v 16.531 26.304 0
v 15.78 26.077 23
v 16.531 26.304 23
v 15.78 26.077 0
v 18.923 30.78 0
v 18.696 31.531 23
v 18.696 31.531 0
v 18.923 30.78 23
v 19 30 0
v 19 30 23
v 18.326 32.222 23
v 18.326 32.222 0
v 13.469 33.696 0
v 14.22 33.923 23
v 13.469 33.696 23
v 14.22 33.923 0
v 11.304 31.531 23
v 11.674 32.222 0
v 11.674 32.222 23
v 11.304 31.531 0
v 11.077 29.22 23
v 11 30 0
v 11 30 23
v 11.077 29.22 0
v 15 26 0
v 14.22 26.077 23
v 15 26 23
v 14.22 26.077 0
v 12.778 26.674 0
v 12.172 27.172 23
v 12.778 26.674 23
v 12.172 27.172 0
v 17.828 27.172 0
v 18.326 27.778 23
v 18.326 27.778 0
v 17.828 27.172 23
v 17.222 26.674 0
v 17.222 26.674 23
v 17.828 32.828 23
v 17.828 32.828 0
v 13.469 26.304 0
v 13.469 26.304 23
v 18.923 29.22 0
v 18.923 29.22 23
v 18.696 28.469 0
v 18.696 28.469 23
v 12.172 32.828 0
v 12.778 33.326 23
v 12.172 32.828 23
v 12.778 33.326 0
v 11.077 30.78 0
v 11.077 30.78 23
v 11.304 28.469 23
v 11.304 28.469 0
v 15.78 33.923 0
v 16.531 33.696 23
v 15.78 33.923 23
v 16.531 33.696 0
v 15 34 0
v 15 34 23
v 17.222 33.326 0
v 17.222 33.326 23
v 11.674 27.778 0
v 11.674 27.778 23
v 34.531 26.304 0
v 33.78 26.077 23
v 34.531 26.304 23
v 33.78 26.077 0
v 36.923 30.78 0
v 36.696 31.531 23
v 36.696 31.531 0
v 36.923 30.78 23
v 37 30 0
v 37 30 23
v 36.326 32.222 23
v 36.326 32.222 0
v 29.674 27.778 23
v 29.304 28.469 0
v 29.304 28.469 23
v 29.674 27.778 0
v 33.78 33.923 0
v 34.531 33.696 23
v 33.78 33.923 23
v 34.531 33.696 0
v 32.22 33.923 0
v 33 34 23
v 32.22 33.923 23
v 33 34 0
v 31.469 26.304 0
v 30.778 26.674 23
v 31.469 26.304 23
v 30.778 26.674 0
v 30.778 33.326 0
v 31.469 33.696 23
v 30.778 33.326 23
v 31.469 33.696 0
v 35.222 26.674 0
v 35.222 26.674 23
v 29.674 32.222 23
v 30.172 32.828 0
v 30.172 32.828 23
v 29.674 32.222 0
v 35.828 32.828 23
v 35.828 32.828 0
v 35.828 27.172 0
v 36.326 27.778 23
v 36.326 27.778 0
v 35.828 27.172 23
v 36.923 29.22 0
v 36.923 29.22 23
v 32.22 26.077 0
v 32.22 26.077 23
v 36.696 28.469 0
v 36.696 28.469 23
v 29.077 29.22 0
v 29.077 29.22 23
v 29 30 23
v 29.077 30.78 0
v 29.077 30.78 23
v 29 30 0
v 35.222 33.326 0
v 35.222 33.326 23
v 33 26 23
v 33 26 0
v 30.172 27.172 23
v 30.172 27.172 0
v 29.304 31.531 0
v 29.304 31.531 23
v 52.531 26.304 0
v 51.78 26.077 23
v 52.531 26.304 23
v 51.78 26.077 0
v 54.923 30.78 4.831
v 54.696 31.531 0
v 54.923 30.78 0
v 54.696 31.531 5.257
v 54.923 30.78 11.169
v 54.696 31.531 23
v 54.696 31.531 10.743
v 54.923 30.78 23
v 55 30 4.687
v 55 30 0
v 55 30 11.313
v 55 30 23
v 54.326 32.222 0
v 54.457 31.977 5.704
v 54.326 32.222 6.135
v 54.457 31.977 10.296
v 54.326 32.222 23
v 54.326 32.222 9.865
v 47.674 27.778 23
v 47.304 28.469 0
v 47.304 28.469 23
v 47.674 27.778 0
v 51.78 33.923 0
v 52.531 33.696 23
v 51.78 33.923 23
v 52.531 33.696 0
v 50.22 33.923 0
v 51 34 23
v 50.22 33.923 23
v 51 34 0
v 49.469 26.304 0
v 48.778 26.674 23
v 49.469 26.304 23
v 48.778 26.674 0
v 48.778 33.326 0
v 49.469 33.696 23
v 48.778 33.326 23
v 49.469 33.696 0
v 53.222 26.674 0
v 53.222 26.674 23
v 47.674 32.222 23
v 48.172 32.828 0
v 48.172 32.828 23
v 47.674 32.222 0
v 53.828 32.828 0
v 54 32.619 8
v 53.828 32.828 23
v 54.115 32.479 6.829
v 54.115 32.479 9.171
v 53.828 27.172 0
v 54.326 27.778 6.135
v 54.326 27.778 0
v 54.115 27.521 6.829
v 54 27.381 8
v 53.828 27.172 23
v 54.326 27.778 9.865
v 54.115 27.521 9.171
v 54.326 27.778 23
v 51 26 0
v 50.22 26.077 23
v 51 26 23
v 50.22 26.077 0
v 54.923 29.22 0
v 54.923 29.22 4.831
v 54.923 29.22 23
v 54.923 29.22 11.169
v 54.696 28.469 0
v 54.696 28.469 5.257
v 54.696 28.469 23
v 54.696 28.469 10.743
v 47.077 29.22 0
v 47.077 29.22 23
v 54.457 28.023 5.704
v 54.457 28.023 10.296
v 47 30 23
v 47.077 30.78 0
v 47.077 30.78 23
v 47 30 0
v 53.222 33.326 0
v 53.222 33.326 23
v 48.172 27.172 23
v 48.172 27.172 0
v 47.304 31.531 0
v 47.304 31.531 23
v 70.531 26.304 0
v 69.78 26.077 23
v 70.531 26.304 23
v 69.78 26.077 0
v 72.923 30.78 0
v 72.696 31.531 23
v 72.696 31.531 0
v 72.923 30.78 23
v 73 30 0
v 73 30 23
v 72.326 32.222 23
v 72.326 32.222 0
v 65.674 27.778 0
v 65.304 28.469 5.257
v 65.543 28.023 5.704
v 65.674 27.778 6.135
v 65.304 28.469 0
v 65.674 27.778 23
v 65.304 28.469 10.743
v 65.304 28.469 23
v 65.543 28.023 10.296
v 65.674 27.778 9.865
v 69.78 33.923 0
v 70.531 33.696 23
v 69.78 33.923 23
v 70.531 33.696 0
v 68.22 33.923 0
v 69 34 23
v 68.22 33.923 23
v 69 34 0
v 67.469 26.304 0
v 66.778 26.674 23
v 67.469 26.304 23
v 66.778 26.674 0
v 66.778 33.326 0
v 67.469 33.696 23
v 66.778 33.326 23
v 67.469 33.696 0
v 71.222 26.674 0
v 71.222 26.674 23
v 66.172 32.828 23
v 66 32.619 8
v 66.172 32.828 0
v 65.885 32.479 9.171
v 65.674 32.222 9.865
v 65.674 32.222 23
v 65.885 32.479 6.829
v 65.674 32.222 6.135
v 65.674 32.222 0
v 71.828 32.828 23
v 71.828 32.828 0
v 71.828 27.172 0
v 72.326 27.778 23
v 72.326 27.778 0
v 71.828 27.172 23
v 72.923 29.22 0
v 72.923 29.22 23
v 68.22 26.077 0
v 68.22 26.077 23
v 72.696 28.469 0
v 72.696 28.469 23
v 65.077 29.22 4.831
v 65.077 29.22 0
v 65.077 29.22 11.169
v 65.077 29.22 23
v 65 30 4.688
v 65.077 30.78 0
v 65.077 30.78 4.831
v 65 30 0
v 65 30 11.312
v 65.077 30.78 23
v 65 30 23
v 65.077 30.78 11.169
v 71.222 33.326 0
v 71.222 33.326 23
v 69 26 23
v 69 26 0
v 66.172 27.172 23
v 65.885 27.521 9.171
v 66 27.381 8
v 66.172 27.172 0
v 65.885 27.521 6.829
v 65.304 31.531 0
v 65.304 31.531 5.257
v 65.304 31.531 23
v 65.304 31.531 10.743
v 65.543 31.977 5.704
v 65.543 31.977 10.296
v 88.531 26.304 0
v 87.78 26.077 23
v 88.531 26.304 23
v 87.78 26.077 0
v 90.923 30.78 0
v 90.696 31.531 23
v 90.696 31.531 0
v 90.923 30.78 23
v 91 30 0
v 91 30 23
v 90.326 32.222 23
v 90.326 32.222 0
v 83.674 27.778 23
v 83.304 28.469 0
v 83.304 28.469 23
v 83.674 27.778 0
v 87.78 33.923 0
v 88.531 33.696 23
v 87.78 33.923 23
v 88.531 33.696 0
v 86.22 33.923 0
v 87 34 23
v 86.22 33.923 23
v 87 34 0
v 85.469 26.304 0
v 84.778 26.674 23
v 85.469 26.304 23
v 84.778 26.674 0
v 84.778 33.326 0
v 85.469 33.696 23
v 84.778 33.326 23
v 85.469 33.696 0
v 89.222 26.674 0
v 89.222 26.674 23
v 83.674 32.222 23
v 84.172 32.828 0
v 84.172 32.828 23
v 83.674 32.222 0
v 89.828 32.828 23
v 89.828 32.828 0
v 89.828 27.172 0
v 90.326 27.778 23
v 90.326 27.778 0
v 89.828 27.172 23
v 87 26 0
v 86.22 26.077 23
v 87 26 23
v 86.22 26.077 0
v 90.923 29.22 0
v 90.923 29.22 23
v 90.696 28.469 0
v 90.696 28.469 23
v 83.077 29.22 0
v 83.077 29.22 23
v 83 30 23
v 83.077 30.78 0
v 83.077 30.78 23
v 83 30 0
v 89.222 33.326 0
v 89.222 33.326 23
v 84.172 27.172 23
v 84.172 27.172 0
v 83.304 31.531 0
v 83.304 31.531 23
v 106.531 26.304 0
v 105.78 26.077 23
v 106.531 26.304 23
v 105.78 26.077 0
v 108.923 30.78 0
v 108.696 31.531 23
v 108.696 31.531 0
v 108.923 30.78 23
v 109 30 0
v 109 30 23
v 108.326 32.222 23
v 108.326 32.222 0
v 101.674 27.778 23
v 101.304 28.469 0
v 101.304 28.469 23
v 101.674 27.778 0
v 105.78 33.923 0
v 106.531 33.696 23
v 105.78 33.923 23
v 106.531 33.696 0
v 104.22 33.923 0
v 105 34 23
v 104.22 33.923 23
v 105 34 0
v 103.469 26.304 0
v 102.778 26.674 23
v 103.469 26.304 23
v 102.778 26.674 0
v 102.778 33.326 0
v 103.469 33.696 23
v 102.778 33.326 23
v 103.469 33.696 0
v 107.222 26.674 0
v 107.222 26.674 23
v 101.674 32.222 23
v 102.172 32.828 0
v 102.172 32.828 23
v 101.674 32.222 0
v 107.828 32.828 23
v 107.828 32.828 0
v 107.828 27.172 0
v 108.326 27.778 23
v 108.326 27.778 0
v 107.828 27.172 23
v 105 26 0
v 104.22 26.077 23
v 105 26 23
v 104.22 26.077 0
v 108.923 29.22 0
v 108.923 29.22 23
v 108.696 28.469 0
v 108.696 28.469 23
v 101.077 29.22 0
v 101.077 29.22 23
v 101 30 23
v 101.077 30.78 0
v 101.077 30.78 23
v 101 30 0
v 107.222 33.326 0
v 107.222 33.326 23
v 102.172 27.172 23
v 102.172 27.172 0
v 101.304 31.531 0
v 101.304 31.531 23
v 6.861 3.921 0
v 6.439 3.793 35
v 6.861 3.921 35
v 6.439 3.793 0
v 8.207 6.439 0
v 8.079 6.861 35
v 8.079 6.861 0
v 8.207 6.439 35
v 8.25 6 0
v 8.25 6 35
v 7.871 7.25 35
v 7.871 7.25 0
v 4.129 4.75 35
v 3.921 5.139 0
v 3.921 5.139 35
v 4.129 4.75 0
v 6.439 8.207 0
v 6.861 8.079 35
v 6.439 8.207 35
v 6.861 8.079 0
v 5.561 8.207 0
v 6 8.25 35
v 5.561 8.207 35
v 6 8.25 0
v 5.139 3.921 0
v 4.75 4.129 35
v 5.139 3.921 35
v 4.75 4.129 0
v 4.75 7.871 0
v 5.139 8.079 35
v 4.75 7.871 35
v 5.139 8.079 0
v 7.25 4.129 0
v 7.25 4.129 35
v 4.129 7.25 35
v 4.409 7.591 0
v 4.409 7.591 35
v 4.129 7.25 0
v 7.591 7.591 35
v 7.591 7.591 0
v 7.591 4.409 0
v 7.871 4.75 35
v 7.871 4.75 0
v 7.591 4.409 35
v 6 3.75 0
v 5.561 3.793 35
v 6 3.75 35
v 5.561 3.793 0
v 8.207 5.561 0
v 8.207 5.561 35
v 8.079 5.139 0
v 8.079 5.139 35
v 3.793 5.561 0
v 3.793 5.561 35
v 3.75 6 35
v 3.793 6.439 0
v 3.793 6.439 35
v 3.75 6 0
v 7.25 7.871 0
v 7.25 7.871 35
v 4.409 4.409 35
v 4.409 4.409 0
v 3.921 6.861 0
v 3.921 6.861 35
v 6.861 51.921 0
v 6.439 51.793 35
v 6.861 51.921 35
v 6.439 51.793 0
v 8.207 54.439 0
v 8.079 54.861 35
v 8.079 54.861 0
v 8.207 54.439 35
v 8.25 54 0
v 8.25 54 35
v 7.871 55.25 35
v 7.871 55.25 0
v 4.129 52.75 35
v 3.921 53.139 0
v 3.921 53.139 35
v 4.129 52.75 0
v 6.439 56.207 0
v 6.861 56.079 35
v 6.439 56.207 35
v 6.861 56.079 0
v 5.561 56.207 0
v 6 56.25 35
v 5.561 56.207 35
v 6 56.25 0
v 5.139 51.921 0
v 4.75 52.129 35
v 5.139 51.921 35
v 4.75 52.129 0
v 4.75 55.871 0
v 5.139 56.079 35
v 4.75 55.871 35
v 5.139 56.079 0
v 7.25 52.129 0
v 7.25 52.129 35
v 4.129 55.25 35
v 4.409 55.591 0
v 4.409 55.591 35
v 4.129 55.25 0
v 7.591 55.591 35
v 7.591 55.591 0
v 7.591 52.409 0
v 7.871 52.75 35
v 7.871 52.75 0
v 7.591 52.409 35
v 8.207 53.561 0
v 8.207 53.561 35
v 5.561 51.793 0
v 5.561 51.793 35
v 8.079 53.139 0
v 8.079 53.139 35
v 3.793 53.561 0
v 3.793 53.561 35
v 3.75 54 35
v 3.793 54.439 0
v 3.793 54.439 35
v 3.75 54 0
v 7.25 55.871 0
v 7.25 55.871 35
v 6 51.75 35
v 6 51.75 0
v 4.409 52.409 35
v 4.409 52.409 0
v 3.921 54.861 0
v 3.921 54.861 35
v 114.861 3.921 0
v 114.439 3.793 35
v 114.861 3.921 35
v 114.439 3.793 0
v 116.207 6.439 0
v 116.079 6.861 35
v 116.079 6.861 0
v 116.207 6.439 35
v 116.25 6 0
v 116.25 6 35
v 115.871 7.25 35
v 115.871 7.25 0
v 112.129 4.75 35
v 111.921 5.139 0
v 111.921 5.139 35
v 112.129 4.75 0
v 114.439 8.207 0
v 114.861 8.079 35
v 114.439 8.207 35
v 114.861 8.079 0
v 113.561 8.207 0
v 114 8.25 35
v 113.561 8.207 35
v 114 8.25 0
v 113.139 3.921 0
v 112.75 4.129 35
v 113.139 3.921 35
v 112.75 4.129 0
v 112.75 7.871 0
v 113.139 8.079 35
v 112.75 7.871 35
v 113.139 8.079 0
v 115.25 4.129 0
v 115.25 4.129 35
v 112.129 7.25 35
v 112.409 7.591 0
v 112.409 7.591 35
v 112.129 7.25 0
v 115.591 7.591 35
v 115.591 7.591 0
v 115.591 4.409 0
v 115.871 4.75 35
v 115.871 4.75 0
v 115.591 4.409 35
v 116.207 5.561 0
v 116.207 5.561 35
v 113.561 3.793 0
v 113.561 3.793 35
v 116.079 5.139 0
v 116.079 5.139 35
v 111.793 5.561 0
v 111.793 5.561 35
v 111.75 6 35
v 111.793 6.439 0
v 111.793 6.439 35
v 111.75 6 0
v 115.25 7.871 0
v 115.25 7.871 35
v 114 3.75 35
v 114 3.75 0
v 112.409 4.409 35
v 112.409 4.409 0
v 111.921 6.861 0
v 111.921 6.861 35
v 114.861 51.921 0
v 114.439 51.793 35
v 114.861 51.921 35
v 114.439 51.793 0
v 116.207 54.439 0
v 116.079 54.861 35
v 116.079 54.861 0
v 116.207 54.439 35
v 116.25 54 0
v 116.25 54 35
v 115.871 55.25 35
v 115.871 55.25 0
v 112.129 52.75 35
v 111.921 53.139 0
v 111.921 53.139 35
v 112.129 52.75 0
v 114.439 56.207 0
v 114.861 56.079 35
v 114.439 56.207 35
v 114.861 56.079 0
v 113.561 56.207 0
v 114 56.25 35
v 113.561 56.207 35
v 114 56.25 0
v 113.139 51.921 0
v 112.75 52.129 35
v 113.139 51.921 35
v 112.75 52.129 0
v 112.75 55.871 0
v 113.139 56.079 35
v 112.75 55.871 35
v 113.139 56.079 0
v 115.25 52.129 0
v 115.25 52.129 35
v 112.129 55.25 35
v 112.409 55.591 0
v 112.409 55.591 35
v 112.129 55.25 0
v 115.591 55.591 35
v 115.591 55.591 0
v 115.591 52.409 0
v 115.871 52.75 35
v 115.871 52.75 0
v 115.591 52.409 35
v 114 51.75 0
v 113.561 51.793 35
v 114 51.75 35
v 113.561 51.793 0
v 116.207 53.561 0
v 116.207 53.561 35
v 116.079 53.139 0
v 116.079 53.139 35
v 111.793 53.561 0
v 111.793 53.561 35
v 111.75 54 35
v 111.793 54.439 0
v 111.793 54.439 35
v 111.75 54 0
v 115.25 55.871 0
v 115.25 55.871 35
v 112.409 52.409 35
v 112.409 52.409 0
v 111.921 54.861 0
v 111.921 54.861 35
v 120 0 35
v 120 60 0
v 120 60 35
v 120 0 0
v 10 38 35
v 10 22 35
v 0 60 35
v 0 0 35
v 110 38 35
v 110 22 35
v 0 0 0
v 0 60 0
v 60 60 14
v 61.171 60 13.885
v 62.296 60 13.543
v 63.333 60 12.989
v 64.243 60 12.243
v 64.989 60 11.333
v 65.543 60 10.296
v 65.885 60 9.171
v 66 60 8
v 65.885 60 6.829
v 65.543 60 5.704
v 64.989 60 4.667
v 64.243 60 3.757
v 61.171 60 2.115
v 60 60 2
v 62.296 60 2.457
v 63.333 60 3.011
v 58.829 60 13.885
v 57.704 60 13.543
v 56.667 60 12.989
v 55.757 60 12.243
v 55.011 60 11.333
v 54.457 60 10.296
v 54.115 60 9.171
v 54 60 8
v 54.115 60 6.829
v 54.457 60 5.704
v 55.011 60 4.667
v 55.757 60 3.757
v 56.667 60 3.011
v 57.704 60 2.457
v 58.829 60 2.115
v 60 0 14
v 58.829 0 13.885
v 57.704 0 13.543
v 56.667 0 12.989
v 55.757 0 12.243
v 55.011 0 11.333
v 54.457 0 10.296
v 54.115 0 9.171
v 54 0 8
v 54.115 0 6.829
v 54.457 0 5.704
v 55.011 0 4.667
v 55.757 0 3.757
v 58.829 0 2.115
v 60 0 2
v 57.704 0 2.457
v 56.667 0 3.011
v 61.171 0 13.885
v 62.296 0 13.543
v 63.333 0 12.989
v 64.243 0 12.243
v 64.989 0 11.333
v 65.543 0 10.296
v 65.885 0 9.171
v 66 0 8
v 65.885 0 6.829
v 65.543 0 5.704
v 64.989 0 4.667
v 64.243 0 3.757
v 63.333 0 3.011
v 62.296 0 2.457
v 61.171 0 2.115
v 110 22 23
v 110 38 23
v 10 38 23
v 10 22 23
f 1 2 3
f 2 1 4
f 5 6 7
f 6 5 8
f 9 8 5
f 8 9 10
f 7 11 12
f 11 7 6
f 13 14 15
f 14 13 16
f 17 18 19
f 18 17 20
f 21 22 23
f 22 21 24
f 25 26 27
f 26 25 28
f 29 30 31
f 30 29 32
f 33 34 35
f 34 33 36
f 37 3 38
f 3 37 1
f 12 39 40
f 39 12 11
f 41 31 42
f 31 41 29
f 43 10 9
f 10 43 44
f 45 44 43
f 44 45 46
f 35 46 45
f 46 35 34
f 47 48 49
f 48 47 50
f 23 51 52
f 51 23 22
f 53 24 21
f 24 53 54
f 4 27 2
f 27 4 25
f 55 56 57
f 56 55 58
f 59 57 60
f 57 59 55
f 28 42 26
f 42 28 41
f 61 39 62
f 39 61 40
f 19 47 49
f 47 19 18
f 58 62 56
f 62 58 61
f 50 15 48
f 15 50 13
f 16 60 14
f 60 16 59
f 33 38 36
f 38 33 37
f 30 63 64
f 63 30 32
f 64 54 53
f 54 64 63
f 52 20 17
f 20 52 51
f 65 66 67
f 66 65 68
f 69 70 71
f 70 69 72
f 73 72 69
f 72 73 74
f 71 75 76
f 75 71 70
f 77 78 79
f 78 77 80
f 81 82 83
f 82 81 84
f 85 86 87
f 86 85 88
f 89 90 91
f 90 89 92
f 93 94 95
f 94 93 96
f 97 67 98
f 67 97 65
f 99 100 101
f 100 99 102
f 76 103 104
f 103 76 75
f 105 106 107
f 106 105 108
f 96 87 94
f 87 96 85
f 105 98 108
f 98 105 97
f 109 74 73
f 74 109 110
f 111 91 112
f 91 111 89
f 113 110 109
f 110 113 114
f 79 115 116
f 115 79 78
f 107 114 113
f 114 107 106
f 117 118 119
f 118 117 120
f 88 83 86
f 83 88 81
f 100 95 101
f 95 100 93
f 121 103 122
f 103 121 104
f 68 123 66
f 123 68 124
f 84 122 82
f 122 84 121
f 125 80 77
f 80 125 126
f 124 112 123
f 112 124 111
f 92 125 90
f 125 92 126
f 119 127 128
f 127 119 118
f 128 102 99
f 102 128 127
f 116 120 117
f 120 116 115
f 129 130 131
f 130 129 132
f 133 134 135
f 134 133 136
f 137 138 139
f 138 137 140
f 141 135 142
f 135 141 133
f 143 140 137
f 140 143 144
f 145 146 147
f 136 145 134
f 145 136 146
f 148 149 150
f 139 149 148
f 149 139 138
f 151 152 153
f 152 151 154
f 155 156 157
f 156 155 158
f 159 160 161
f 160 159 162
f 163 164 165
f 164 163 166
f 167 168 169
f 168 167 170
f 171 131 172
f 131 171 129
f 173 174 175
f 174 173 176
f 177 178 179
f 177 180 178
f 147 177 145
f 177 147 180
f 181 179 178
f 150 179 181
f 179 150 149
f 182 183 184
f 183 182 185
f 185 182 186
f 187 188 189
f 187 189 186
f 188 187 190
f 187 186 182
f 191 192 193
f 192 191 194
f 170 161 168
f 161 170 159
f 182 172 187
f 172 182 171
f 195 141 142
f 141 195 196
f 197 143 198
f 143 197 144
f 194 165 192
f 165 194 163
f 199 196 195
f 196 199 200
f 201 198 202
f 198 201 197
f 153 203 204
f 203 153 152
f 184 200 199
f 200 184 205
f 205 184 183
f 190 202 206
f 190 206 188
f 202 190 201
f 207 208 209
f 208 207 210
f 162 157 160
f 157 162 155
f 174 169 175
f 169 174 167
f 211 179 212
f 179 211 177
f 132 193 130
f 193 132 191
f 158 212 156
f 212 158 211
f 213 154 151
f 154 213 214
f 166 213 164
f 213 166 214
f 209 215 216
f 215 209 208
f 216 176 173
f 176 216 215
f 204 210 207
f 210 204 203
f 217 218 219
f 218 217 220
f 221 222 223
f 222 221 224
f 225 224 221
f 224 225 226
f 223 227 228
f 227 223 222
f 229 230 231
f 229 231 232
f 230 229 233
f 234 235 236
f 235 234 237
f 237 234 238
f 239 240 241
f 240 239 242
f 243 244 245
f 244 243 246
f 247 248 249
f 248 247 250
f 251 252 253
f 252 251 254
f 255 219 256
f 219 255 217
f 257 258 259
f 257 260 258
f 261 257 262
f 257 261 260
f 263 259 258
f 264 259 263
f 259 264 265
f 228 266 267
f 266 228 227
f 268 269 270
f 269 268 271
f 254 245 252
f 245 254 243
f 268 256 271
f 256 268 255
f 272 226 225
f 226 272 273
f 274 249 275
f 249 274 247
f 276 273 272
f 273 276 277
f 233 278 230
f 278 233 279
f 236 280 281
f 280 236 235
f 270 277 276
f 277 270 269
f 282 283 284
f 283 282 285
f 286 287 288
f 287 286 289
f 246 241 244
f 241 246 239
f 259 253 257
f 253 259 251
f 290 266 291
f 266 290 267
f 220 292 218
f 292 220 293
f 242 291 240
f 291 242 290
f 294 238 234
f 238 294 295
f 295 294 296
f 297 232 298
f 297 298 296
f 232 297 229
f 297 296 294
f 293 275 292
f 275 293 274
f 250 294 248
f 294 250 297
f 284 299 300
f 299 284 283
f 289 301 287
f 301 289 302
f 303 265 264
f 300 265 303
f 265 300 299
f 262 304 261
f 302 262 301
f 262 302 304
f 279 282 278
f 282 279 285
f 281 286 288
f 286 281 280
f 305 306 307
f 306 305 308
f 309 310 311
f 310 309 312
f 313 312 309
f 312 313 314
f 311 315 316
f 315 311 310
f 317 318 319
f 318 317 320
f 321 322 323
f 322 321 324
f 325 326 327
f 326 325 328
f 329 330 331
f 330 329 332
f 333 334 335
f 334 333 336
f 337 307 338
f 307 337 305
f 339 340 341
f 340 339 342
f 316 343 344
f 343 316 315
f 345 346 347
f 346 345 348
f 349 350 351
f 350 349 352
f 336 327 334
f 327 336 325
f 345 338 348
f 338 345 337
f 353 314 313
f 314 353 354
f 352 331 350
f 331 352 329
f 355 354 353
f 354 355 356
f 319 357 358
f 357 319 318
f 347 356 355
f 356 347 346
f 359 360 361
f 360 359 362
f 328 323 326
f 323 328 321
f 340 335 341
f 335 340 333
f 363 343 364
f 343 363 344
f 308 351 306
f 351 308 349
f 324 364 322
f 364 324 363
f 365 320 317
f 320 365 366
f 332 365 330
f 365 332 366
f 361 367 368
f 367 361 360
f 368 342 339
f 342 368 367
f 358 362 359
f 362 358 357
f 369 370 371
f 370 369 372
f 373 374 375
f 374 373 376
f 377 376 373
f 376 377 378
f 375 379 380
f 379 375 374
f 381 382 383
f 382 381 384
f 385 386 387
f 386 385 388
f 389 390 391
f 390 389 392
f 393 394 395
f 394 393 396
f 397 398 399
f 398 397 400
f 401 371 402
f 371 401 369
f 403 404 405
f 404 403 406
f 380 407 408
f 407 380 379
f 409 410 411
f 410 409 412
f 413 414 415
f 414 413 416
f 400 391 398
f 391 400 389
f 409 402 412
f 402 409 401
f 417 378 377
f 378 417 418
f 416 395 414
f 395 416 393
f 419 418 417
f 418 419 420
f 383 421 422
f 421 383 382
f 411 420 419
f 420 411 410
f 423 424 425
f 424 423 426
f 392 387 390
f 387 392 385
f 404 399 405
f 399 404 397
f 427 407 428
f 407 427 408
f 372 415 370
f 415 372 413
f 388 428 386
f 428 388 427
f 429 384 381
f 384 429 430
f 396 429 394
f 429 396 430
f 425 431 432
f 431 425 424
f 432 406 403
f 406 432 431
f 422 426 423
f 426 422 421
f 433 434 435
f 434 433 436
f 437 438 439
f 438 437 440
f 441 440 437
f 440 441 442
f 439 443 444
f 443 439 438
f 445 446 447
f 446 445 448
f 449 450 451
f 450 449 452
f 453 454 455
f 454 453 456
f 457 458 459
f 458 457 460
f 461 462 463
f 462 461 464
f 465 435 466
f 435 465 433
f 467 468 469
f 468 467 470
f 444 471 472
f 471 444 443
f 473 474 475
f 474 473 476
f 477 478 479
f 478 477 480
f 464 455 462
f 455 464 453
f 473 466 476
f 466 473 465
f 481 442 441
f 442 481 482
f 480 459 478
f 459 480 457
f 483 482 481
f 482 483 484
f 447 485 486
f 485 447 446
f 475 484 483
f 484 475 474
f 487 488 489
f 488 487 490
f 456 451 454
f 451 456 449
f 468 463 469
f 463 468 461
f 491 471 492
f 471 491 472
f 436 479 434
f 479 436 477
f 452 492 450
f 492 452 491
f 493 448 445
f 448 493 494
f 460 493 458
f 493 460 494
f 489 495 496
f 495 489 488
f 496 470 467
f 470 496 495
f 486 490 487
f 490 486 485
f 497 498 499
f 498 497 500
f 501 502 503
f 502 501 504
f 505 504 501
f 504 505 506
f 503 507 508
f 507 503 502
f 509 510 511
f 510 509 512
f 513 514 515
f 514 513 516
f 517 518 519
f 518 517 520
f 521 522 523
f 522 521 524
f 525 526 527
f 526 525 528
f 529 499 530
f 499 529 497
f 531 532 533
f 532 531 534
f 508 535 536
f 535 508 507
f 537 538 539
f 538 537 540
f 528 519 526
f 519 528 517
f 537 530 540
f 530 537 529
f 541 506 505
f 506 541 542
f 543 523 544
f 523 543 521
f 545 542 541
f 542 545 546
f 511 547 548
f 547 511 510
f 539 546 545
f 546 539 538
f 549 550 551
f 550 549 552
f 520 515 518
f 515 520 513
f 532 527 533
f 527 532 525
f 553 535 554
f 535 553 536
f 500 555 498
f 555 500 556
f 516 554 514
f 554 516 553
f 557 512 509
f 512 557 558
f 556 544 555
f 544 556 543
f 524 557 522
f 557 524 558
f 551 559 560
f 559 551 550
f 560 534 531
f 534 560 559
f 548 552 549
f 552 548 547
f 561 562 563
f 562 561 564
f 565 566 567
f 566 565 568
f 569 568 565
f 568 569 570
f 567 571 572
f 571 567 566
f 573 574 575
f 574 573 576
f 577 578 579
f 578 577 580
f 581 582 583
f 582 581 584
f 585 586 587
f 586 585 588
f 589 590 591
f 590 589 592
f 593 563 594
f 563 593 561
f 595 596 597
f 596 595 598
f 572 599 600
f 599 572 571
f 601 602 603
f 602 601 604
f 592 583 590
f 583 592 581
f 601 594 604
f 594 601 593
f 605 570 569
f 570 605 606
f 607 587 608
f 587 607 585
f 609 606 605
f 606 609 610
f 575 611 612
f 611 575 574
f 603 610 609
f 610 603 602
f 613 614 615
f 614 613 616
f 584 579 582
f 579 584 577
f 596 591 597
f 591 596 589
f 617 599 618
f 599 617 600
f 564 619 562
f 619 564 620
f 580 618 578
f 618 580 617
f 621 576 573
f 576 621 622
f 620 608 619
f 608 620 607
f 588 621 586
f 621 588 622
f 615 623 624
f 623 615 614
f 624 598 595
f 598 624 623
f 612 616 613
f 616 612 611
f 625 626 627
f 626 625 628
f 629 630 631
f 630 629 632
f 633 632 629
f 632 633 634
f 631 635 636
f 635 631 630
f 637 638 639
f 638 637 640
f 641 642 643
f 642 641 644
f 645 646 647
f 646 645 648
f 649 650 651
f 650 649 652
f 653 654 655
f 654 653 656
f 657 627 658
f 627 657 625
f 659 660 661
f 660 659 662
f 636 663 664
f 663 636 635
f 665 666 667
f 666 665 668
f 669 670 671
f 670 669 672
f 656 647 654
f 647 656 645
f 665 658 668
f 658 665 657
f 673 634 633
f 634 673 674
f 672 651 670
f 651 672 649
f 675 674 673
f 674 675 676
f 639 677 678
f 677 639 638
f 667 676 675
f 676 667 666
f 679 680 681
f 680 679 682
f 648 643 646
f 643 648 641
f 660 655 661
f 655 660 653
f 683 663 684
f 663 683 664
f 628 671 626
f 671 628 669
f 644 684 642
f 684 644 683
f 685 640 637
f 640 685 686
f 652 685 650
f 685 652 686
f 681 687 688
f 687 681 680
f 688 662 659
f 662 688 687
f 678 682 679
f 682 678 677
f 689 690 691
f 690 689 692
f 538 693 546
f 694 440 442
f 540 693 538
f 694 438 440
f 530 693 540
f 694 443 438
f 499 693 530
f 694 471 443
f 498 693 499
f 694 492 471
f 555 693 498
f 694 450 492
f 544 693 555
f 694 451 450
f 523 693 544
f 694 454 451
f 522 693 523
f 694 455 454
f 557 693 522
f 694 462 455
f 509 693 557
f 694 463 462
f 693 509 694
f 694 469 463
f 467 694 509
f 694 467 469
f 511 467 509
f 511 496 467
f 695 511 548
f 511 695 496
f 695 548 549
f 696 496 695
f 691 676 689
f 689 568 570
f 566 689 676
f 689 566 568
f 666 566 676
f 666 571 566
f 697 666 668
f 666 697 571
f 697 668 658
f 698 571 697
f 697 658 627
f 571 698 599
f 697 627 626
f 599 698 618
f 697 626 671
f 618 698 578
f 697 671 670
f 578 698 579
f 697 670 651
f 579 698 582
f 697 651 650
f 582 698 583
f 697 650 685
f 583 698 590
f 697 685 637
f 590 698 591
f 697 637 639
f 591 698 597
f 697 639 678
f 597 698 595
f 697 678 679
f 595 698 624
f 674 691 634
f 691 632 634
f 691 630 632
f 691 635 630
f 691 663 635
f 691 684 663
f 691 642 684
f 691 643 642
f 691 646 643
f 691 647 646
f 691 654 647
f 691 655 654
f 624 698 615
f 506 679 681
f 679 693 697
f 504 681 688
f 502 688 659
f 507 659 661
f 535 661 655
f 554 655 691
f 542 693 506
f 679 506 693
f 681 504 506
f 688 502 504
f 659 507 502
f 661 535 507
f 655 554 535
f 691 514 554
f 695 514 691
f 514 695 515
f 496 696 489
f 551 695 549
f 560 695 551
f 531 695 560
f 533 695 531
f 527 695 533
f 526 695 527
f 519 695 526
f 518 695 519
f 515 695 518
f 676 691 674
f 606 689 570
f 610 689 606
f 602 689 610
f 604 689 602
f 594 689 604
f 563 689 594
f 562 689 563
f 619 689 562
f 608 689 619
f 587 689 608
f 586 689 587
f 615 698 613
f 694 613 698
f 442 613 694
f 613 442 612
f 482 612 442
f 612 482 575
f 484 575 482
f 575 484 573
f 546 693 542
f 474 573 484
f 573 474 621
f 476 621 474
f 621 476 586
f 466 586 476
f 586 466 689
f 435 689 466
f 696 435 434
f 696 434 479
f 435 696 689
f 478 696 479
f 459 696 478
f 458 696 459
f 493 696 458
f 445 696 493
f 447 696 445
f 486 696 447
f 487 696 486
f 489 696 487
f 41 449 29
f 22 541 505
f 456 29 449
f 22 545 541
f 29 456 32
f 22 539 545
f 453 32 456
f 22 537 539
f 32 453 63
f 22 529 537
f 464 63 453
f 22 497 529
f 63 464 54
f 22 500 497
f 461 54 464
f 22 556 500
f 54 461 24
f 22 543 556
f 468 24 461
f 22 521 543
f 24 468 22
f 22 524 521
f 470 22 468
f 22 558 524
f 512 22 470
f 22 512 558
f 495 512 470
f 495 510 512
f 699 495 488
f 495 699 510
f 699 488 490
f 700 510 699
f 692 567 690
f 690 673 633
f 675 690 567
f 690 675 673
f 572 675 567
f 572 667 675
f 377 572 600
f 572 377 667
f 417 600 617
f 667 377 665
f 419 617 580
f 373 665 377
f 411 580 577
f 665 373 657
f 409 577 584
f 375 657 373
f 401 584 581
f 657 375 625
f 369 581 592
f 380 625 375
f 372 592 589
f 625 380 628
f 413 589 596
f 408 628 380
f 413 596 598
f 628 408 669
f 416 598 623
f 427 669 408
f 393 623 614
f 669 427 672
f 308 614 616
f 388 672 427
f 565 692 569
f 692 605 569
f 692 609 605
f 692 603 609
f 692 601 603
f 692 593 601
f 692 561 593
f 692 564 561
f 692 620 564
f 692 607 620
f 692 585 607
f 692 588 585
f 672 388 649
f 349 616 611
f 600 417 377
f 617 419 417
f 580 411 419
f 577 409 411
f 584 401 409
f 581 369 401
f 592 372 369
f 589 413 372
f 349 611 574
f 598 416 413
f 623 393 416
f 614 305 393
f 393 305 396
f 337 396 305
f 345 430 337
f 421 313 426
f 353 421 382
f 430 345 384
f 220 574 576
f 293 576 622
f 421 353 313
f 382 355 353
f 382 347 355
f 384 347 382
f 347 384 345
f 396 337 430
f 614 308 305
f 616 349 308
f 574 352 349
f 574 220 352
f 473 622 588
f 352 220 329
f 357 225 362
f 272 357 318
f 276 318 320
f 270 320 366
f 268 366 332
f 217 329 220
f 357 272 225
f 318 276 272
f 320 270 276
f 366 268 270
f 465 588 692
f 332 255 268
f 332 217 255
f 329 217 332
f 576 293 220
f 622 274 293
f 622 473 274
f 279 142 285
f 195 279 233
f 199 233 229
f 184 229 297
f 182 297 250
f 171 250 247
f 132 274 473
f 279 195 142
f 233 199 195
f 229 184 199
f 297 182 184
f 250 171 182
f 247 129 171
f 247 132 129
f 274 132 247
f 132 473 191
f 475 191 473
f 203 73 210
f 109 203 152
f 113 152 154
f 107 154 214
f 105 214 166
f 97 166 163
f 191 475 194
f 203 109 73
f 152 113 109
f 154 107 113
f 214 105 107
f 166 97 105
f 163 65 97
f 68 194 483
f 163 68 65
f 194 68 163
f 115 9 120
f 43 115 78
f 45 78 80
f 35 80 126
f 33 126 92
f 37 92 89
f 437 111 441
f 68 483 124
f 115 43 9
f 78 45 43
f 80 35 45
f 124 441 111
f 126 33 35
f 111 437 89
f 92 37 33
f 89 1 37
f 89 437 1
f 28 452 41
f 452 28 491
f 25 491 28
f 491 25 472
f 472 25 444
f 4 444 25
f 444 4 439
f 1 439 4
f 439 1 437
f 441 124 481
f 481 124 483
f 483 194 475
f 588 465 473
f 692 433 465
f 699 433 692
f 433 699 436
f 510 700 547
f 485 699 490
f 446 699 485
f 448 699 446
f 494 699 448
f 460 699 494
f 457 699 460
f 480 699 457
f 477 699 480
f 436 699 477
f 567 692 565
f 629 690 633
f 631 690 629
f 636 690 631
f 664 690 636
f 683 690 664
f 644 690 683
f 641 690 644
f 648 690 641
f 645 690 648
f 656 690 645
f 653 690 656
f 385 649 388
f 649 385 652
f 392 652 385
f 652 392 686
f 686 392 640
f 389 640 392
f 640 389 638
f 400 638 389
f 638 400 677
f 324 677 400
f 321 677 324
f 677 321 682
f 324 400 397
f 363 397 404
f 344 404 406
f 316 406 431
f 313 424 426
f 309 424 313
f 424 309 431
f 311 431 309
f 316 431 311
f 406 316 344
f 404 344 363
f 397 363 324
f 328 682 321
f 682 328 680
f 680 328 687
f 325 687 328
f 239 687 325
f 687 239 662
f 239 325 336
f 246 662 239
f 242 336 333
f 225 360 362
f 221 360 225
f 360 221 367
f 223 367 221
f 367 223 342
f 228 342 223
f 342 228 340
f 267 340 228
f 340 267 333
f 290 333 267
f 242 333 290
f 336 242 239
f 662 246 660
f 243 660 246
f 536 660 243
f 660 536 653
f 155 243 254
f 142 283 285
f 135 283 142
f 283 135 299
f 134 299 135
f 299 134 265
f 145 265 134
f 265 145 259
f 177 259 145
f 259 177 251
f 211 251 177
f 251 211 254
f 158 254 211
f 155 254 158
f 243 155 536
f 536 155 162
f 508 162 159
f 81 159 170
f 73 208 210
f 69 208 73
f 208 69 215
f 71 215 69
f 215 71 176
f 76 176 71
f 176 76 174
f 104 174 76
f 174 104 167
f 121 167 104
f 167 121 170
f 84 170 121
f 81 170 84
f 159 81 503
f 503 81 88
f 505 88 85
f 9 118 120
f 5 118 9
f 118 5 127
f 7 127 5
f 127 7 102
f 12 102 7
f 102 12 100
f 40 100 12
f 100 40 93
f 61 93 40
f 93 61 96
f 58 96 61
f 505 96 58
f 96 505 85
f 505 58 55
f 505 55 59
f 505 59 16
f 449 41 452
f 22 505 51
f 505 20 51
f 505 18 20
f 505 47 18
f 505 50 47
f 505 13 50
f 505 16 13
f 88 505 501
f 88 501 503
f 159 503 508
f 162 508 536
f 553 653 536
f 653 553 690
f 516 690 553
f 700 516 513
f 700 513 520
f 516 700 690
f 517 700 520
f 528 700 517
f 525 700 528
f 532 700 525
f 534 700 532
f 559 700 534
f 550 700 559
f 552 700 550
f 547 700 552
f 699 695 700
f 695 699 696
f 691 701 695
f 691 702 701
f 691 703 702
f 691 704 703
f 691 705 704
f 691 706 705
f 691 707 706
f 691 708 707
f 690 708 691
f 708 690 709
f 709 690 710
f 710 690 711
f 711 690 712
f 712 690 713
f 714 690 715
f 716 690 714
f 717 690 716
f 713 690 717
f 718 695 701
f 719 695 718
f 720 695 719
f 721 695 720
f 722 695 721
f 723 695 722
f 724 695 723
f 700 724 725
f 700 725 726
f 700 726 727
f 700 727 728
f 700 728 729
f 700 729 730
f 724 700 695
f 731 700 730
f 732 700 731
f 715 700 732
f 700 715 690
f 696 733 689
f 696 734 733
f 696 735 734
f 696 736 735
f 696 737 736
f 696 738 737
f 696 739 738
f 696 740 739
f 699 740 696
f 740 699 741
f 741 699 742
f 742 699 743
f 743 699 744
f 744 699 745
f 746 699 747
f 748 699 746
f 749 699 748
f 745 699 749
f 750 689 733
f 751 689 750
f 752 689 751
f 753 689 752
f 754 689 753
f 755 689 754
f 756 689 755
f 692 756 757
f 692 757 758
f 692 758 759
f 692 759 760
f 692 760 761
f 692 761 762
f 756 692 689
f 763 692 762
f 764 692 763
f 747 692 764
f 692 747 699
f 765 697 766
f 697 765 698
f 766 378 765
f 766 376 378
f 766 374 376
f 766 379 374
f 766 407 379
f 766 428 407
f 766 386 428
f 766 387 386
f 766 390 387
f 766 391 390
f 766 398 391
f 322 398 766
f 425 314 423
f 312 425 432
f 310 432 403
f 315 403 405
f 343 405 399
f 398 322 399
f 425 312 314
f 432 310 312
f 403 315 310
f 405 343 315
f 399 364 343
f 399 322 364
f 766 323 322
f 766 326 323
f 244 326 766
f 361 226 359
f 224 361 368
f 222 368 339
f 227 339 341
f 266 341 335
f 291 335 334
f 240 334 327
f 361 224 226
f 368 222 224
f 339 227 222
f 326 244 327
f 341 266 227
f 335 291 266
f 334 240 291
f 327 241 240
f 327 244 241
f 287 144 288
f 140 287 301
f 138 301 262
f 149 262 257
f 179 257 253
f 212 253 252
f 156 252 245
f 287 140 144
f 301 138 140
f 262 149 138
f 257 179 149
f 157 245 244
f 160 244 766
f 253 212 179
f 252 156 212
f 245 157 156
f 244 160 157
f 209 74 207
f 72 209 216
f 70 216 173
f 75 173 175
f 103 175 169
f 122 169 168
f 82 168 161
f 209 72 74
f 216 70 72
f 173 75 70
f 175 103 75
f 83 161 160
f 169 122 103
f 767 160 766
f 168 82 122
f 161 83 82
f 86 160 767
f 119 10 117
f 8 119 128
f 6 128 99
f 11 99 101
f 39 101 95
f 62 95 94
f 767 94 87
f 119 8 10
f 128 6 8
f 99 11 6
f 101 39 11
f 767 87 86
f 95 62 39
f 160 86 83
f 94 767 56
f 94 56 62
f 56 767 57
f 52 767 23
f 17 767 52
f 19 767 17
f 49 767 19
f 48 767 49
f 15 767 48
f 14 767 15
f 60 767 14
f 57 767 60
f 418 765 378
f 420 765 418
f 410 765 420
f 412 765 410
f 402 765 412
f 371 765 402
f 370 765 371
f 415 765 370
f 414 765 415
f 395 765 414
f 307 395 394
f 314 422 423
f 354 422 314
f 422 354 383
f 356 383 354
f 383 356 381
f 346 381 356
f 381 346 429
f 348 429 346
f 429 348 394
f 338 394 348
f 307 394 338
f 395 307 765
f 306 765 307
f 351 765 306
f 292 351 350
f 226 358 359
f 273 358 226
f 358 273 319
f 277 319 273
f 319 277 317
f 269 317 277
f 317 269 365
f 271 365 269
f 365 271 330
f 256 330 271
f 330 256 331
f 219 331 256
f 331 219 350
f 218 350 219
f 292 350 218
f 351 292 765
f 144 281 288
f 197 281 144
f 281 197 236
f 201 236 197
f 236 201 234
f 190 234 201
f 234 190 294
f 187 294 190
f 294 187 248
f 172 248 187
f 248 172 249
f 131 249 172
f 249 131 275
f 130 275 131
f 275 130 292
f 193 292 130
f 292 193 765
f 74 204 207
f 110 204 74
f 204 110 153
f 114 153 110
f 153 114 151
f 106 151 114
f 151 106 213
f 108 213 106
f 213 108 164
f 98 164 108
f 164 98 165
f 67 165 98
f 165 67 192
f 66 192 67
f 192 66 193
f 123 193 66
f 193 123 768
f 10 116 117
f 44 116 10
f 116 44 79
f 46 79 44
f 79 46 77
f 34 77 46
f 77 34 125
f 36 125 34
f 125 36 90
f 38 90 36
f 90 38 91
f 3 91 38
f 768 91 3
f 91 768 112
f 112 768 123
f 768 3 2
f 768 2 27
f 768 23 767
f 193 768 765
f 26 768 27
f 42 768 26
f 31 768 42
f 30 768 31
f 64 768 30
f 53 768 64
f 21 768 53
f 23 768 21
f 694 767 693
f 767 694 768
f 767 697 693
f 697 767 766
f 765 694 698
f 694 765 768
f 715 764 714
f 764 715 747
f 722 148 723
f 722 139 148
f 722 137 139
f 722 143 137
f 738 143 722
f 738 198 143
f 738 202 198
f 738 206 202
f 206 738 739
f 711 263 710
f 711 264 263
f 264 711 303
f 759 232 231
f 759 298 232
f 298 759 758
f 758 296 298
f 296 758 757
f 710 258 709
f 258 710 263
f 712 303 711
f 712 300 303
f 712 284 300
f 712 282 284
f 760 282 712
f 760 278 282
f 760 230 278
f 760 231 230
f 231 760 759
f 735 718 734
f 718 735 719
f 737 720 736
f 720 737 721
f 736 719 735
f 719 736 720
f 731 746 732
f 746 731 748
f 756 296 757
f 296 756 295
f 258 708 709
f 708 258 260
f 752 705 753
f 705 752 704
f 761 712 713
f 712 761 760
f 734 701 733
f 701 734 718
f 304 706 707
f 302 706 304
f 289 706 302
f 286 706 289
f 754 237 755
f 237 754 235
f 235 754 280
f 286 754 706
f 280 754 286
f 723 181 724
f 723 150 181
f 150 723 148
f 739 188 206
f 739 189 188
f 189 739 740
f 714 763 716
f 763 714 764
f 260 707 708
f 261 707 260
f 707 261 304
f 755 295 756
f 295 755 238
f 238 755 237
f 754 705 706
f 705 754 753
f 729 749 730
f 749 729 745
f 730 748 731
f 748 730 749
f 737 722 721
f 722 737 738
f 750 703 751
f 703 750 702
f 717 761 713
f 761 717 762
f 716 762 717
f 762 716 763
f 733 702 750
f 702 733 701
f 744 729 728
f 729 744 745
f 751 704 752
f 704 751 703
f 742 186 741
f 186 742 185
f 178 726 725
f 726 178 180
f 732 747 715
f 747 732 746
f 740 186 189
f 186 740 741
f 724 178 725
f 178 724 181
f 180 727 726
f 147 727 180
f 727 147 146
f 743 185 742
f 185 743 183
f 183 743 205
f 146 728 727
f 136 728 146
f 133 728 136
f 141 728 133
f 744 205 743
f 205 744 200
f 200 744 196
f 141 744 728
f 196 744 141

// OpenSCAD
$fn = 32;

// ----------------------------------------------------------------------
// Manifold block: side_outlet manifold
// ----------------------------------------------------------------------

// --- parameters (mm) ---
block_l = 120;            // block length, X
block_w = 60;             // block width, Y
block_h = 35;             // block height, Z
port_d = 8;               // port bore diameter
port_pitch = 18;          // port pitch along X
gallery_d = 16;           // top gallery width, Y
gallery_depth = 12;       // gallery pocket depth
wall_p = 10;              // gallery end wall thickness, X
mnt_d = 4.5;              // mounting hole diameter
mnt_in = 6;               // mounting hole inset from the edges
out_d = 12;               // outlet bore diameter
out_z = 8;                // outlet axis height
fit_tol = 0.05;           // tolerance for press fits, mm
free_tol = 0.2;           // tolerance for clearance fits, mm

n_ports = 6;  // ports in the row
port_x0 = (block_l - (n_ports - 1) * port_pitch) / 2;  // first port X

difference() {
  cube([block_l, block_w, block_h]);
  for (i = [0 : n_ports - 1])
    translate([port_x0 + i * port_pitch, block_w / 2, -1])
      cylinder(h = block_h + 2, d = port_d);
  translate([wall_p, block_w / 2 - gallery_d / 2, block_h - gallery_depth])
    cube([block_l - 2 * wall_p, gallery_d, gallery_depth + 1]);
  for (cx = [mnt_in, block_l - mnt_in])
    for (cy = [mnt_in, block_w - mnt_in])
      translate([cx, cy, -1]) cylinder(h = block_h + 2, d = mnt_d);
  translate([block_l / 2, -1, out_z]) rotate([-90, 0, 0])
    cylinder(h = block_w + 2, d = out_d);
}
